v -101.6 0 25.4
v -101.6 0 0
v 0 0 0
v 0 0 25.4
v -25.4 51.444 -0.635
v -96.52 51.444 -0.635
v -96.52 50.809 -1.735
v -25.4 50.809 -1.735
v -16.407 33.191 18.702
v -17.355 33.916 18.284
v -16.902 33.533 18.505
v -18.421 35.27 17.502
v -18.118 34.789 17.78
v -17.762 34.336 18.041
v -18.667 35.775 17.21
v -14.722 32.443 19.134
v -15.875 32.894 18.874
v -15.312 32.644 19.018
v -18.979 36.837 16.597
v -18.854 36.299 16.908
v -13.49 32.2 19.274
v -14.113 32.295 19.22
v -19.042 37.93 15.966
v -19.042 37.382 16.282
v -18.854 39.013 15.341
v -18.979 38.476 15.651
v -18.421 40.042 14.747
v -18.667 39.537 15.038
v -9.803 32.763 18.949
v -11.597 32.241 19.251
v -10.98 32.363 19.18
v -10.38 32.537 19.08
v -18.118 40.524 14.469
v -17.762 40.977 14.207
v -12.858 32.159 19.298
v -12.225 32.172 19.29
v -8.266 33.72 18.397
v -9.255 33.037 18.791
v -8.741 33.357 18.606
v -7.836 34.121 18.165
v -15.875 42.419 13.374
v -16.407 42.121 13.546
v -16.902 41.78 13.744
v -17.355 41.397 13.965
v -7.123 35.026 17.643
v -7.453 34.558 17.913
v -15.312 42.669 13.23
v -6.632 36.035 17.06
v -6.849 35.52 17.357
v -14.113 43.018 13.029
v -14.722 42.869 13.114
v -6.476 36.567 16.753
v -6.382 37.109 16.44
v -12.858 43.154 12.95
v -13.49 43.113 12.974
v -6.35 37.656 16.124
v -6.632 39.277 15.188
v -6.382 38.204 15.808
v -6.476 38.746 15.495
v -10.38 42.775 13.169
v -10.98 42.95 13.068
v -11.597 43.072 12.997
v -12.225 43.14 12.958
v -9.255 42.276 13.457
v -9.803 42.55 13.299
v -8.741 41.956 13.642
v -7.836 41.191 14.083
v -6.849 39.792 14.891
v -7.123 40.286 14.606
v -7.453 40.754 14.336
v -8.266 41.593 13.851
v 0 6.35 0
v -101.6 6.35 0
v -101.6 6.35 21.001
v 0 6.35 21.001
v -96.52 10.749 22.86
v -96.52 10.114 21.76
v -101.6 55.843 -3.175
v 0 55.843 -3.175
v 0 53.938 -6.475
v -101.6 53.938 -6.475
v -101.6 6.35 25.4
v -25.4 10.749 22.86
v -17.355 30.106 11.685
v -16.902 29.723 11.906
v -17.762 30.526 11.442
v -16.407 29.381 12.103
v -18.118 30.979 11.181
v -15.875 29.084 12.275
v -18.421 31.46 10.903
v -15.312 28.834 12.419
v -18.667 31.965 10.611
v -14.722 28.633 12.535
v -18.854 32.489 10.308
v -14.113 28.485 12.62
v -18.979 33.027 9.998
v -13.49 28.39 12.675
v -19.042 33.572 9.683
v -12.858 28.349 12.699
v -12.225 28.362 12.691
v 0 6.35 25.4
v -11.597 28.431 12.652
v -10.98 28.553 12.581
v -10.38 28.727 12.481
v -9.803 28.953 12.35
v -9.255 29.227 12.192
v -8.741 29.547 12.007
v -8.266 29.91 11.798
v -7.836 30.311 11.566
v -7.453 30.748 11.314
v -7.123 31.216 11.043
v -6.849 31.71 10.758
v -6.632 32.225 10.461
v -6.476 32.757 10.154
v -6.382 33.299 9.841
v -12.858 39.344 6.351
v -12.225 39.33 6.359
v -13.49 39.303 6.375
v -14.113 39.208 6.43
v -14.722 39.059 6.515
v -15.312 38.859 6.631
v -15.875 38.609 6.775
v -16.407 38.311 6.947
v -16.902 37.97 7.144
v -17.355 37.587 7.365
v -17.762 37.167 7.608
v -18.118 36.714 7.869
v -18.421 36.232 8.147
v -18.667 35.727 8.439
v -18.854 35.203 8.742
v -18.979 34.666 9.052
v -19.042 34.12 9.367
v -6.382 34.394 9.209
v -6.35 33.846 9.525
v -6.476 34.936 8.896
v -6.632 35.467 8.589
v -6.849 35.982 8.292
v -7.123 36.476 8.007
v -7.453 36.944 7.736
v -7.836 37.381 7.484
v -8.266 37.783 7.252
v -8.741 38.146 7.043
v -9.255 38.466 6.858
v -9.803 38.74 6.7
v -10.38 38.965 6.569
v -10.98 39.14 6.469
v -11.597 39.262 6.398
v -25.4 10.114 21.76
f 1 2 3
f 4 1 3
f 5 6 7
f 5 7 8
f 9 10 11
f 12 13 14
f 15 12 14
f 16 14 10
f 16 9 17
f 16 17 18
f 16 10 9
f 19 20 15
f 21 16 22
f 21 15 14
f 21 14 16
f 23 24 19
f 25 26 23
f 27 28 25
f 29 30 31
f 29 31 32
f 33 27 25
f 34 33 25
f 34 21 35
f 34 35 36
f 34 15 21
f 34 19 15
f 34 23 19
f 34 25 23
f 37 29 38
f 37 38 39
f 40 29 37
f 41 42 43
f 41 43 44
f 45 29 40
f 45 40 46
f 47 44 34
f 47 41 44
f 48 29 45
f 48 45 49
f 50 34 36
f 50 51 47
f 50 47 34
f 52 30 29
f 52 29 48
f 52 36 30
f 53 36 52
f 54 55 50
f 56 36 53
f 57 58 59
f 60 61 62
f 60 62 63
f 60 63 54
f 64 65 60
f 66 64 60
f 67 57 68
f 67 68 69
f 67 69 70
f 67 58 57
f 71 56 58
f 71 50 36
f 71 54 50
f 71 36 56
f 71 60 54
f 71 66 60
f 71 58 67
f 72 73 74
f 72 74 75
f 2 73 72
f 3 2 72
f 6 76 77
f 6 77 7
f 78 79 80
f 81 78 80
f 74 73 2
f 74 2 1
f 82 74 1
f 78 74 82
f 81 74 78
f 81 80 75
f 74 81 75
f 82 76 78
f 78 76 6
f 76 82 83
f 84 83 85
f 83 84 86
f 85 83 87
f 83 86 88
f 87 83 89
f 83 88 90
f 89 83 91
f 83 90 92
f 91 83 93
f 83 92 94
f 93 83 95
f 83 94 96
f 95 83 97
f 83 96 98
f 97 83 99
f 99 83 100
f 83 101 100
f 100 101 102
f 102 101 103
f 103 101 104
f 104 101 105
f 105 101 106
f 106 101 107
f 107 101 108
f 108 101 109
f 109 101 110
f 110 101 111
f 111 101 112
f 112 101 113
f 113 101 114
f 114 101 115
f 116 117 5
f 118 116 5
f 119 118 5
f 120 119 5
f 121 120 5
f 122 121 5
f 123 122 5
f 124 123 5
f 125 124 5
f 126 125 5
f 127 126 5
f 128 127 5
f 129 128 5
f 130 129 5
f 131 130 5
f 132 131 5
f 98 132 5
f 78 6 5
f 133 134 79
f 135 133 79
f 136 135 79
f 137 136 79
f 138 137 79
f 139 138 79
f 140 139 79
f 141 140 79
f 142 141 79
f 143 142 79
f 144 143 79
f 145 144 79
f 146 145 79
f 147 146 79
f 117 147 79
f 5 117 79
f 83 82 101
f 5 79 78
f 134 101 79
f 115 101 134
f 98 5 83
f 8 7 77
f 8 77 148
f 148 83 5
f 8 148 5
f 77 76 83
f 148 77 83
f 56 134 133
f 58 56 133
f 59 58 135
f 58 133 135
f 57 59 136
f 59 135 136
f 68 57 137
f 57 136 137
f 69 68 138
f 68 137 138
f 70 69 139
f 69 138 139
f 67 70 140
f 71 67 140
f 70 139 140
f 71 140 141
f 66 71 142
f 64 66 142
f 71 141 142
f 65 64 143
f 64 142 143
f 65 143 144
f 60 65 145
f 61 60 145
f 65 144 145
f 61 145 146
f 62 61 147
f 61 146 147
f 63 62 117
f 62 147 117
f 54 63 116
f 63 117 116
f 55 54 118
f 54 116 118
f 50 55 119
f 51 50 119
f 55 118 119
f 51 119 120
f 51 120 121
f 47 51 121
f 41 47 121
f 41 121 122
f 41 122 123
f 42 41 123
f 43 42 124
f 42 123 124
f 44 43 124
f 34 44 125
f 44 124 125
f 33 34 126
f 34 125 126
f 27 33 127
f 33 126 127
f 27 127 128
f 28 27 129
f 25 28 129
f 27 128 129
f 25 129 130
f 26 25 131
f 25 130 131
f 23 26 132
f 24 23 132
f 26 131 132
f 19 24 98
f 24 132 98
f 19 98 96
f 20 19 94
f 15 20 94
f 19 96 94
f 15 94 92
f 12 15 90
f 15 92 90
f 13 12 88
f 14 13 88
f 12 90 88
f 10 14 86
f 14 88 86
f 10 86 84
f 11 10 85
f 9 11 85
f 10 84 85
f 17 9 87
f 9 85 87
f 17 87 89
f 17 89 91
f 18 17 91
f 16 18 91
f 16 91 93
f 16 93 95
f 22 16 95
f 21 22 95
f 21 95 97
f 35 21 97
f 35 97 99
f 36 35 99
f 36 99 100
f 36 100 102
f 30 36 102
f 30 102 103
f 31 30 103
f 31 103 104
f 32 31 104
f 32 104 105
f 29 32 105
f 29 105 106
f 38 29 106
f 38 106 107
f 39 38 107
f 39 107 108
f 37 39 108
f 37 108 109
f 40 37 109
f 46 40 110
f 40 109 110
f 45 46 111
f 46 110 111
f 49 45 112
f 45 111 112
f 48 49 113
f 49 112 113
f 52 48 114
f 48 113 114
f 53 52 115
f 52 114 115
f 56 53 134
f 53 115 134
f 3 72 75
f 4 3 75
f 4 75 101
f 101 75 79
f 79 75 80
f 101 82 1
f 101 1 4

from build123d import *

# Parameters (mm, degrees)
SKETCH1_W           = 101.6
SKETCH1_H           = 6.35
BOSS_EXTRUDE1_DEPTH = 25.4
BOSS_EXTRUDE2_DEPTH = 101.6
SKETCH3_W           = 71.12
SKETCH3_H           = 46.99
CUT_EXTRUDE1_DEPTH  = 1.27
SKETCH4_R           = 6.35
BOSS_EXTRUDE3_DEPTH = 7.62


with BuildPart() as part:
    # Sketch1 → Boss-Extrude1 (new body)
    with BuildSketch(Plane.XY):
        with Locations((-50.8, 3.175)):
            Rectangle(SKETCH1_W, SKETCH1_H)
    extrude(amount=BOSS_EXTRUDE1_DEPTH)

    # Sketch2 → Boss-Extrude2 (add)
    with BuildSketch(Plane(origin=(0, 0, 0), x_dir=(0, 0, -1), z_dir=(1, 0, 0))):
        Polygon((-25.4, 6.35), (3.175, 55.843351826), (6.474556788, 53.938351826), (-21.000590949, 6.35), align=None)
    extrude(amount=-BOSS_EXTRUDE2_DEPTH)

    # Sketch3 → Cut-Extrude1 (cut)
    with BuildSketch(Plane(origin=(0, 12.586022628, 21.799630657), x_dir=(1, 0, 0), z_dir=(0, 0.5, 0.866025404))):
        with Locations((-60.96, 21.374261314)):
            Rectangle(SKETCH3_W, SKETCH3_H)
    extrude(amount=-CUT_EXTRUDE1_DEPTH, mode=Mode.SUBTRACT)

    # Sketch4 → Boss-Extrude3 (add)
    with BuildSketch(Plane(origin=(0, 12.586022628, 21.799630657), x_dir=(1, 0, 0), z_dir=(0, 0.5, 0.866025404))):
        with Locations((-12.7, 24.549261314)):
            Circle(SKETCH4_R)
    extrude(amount=BOSS_EXTRUDE3_DEPTH)


solid = part.part
